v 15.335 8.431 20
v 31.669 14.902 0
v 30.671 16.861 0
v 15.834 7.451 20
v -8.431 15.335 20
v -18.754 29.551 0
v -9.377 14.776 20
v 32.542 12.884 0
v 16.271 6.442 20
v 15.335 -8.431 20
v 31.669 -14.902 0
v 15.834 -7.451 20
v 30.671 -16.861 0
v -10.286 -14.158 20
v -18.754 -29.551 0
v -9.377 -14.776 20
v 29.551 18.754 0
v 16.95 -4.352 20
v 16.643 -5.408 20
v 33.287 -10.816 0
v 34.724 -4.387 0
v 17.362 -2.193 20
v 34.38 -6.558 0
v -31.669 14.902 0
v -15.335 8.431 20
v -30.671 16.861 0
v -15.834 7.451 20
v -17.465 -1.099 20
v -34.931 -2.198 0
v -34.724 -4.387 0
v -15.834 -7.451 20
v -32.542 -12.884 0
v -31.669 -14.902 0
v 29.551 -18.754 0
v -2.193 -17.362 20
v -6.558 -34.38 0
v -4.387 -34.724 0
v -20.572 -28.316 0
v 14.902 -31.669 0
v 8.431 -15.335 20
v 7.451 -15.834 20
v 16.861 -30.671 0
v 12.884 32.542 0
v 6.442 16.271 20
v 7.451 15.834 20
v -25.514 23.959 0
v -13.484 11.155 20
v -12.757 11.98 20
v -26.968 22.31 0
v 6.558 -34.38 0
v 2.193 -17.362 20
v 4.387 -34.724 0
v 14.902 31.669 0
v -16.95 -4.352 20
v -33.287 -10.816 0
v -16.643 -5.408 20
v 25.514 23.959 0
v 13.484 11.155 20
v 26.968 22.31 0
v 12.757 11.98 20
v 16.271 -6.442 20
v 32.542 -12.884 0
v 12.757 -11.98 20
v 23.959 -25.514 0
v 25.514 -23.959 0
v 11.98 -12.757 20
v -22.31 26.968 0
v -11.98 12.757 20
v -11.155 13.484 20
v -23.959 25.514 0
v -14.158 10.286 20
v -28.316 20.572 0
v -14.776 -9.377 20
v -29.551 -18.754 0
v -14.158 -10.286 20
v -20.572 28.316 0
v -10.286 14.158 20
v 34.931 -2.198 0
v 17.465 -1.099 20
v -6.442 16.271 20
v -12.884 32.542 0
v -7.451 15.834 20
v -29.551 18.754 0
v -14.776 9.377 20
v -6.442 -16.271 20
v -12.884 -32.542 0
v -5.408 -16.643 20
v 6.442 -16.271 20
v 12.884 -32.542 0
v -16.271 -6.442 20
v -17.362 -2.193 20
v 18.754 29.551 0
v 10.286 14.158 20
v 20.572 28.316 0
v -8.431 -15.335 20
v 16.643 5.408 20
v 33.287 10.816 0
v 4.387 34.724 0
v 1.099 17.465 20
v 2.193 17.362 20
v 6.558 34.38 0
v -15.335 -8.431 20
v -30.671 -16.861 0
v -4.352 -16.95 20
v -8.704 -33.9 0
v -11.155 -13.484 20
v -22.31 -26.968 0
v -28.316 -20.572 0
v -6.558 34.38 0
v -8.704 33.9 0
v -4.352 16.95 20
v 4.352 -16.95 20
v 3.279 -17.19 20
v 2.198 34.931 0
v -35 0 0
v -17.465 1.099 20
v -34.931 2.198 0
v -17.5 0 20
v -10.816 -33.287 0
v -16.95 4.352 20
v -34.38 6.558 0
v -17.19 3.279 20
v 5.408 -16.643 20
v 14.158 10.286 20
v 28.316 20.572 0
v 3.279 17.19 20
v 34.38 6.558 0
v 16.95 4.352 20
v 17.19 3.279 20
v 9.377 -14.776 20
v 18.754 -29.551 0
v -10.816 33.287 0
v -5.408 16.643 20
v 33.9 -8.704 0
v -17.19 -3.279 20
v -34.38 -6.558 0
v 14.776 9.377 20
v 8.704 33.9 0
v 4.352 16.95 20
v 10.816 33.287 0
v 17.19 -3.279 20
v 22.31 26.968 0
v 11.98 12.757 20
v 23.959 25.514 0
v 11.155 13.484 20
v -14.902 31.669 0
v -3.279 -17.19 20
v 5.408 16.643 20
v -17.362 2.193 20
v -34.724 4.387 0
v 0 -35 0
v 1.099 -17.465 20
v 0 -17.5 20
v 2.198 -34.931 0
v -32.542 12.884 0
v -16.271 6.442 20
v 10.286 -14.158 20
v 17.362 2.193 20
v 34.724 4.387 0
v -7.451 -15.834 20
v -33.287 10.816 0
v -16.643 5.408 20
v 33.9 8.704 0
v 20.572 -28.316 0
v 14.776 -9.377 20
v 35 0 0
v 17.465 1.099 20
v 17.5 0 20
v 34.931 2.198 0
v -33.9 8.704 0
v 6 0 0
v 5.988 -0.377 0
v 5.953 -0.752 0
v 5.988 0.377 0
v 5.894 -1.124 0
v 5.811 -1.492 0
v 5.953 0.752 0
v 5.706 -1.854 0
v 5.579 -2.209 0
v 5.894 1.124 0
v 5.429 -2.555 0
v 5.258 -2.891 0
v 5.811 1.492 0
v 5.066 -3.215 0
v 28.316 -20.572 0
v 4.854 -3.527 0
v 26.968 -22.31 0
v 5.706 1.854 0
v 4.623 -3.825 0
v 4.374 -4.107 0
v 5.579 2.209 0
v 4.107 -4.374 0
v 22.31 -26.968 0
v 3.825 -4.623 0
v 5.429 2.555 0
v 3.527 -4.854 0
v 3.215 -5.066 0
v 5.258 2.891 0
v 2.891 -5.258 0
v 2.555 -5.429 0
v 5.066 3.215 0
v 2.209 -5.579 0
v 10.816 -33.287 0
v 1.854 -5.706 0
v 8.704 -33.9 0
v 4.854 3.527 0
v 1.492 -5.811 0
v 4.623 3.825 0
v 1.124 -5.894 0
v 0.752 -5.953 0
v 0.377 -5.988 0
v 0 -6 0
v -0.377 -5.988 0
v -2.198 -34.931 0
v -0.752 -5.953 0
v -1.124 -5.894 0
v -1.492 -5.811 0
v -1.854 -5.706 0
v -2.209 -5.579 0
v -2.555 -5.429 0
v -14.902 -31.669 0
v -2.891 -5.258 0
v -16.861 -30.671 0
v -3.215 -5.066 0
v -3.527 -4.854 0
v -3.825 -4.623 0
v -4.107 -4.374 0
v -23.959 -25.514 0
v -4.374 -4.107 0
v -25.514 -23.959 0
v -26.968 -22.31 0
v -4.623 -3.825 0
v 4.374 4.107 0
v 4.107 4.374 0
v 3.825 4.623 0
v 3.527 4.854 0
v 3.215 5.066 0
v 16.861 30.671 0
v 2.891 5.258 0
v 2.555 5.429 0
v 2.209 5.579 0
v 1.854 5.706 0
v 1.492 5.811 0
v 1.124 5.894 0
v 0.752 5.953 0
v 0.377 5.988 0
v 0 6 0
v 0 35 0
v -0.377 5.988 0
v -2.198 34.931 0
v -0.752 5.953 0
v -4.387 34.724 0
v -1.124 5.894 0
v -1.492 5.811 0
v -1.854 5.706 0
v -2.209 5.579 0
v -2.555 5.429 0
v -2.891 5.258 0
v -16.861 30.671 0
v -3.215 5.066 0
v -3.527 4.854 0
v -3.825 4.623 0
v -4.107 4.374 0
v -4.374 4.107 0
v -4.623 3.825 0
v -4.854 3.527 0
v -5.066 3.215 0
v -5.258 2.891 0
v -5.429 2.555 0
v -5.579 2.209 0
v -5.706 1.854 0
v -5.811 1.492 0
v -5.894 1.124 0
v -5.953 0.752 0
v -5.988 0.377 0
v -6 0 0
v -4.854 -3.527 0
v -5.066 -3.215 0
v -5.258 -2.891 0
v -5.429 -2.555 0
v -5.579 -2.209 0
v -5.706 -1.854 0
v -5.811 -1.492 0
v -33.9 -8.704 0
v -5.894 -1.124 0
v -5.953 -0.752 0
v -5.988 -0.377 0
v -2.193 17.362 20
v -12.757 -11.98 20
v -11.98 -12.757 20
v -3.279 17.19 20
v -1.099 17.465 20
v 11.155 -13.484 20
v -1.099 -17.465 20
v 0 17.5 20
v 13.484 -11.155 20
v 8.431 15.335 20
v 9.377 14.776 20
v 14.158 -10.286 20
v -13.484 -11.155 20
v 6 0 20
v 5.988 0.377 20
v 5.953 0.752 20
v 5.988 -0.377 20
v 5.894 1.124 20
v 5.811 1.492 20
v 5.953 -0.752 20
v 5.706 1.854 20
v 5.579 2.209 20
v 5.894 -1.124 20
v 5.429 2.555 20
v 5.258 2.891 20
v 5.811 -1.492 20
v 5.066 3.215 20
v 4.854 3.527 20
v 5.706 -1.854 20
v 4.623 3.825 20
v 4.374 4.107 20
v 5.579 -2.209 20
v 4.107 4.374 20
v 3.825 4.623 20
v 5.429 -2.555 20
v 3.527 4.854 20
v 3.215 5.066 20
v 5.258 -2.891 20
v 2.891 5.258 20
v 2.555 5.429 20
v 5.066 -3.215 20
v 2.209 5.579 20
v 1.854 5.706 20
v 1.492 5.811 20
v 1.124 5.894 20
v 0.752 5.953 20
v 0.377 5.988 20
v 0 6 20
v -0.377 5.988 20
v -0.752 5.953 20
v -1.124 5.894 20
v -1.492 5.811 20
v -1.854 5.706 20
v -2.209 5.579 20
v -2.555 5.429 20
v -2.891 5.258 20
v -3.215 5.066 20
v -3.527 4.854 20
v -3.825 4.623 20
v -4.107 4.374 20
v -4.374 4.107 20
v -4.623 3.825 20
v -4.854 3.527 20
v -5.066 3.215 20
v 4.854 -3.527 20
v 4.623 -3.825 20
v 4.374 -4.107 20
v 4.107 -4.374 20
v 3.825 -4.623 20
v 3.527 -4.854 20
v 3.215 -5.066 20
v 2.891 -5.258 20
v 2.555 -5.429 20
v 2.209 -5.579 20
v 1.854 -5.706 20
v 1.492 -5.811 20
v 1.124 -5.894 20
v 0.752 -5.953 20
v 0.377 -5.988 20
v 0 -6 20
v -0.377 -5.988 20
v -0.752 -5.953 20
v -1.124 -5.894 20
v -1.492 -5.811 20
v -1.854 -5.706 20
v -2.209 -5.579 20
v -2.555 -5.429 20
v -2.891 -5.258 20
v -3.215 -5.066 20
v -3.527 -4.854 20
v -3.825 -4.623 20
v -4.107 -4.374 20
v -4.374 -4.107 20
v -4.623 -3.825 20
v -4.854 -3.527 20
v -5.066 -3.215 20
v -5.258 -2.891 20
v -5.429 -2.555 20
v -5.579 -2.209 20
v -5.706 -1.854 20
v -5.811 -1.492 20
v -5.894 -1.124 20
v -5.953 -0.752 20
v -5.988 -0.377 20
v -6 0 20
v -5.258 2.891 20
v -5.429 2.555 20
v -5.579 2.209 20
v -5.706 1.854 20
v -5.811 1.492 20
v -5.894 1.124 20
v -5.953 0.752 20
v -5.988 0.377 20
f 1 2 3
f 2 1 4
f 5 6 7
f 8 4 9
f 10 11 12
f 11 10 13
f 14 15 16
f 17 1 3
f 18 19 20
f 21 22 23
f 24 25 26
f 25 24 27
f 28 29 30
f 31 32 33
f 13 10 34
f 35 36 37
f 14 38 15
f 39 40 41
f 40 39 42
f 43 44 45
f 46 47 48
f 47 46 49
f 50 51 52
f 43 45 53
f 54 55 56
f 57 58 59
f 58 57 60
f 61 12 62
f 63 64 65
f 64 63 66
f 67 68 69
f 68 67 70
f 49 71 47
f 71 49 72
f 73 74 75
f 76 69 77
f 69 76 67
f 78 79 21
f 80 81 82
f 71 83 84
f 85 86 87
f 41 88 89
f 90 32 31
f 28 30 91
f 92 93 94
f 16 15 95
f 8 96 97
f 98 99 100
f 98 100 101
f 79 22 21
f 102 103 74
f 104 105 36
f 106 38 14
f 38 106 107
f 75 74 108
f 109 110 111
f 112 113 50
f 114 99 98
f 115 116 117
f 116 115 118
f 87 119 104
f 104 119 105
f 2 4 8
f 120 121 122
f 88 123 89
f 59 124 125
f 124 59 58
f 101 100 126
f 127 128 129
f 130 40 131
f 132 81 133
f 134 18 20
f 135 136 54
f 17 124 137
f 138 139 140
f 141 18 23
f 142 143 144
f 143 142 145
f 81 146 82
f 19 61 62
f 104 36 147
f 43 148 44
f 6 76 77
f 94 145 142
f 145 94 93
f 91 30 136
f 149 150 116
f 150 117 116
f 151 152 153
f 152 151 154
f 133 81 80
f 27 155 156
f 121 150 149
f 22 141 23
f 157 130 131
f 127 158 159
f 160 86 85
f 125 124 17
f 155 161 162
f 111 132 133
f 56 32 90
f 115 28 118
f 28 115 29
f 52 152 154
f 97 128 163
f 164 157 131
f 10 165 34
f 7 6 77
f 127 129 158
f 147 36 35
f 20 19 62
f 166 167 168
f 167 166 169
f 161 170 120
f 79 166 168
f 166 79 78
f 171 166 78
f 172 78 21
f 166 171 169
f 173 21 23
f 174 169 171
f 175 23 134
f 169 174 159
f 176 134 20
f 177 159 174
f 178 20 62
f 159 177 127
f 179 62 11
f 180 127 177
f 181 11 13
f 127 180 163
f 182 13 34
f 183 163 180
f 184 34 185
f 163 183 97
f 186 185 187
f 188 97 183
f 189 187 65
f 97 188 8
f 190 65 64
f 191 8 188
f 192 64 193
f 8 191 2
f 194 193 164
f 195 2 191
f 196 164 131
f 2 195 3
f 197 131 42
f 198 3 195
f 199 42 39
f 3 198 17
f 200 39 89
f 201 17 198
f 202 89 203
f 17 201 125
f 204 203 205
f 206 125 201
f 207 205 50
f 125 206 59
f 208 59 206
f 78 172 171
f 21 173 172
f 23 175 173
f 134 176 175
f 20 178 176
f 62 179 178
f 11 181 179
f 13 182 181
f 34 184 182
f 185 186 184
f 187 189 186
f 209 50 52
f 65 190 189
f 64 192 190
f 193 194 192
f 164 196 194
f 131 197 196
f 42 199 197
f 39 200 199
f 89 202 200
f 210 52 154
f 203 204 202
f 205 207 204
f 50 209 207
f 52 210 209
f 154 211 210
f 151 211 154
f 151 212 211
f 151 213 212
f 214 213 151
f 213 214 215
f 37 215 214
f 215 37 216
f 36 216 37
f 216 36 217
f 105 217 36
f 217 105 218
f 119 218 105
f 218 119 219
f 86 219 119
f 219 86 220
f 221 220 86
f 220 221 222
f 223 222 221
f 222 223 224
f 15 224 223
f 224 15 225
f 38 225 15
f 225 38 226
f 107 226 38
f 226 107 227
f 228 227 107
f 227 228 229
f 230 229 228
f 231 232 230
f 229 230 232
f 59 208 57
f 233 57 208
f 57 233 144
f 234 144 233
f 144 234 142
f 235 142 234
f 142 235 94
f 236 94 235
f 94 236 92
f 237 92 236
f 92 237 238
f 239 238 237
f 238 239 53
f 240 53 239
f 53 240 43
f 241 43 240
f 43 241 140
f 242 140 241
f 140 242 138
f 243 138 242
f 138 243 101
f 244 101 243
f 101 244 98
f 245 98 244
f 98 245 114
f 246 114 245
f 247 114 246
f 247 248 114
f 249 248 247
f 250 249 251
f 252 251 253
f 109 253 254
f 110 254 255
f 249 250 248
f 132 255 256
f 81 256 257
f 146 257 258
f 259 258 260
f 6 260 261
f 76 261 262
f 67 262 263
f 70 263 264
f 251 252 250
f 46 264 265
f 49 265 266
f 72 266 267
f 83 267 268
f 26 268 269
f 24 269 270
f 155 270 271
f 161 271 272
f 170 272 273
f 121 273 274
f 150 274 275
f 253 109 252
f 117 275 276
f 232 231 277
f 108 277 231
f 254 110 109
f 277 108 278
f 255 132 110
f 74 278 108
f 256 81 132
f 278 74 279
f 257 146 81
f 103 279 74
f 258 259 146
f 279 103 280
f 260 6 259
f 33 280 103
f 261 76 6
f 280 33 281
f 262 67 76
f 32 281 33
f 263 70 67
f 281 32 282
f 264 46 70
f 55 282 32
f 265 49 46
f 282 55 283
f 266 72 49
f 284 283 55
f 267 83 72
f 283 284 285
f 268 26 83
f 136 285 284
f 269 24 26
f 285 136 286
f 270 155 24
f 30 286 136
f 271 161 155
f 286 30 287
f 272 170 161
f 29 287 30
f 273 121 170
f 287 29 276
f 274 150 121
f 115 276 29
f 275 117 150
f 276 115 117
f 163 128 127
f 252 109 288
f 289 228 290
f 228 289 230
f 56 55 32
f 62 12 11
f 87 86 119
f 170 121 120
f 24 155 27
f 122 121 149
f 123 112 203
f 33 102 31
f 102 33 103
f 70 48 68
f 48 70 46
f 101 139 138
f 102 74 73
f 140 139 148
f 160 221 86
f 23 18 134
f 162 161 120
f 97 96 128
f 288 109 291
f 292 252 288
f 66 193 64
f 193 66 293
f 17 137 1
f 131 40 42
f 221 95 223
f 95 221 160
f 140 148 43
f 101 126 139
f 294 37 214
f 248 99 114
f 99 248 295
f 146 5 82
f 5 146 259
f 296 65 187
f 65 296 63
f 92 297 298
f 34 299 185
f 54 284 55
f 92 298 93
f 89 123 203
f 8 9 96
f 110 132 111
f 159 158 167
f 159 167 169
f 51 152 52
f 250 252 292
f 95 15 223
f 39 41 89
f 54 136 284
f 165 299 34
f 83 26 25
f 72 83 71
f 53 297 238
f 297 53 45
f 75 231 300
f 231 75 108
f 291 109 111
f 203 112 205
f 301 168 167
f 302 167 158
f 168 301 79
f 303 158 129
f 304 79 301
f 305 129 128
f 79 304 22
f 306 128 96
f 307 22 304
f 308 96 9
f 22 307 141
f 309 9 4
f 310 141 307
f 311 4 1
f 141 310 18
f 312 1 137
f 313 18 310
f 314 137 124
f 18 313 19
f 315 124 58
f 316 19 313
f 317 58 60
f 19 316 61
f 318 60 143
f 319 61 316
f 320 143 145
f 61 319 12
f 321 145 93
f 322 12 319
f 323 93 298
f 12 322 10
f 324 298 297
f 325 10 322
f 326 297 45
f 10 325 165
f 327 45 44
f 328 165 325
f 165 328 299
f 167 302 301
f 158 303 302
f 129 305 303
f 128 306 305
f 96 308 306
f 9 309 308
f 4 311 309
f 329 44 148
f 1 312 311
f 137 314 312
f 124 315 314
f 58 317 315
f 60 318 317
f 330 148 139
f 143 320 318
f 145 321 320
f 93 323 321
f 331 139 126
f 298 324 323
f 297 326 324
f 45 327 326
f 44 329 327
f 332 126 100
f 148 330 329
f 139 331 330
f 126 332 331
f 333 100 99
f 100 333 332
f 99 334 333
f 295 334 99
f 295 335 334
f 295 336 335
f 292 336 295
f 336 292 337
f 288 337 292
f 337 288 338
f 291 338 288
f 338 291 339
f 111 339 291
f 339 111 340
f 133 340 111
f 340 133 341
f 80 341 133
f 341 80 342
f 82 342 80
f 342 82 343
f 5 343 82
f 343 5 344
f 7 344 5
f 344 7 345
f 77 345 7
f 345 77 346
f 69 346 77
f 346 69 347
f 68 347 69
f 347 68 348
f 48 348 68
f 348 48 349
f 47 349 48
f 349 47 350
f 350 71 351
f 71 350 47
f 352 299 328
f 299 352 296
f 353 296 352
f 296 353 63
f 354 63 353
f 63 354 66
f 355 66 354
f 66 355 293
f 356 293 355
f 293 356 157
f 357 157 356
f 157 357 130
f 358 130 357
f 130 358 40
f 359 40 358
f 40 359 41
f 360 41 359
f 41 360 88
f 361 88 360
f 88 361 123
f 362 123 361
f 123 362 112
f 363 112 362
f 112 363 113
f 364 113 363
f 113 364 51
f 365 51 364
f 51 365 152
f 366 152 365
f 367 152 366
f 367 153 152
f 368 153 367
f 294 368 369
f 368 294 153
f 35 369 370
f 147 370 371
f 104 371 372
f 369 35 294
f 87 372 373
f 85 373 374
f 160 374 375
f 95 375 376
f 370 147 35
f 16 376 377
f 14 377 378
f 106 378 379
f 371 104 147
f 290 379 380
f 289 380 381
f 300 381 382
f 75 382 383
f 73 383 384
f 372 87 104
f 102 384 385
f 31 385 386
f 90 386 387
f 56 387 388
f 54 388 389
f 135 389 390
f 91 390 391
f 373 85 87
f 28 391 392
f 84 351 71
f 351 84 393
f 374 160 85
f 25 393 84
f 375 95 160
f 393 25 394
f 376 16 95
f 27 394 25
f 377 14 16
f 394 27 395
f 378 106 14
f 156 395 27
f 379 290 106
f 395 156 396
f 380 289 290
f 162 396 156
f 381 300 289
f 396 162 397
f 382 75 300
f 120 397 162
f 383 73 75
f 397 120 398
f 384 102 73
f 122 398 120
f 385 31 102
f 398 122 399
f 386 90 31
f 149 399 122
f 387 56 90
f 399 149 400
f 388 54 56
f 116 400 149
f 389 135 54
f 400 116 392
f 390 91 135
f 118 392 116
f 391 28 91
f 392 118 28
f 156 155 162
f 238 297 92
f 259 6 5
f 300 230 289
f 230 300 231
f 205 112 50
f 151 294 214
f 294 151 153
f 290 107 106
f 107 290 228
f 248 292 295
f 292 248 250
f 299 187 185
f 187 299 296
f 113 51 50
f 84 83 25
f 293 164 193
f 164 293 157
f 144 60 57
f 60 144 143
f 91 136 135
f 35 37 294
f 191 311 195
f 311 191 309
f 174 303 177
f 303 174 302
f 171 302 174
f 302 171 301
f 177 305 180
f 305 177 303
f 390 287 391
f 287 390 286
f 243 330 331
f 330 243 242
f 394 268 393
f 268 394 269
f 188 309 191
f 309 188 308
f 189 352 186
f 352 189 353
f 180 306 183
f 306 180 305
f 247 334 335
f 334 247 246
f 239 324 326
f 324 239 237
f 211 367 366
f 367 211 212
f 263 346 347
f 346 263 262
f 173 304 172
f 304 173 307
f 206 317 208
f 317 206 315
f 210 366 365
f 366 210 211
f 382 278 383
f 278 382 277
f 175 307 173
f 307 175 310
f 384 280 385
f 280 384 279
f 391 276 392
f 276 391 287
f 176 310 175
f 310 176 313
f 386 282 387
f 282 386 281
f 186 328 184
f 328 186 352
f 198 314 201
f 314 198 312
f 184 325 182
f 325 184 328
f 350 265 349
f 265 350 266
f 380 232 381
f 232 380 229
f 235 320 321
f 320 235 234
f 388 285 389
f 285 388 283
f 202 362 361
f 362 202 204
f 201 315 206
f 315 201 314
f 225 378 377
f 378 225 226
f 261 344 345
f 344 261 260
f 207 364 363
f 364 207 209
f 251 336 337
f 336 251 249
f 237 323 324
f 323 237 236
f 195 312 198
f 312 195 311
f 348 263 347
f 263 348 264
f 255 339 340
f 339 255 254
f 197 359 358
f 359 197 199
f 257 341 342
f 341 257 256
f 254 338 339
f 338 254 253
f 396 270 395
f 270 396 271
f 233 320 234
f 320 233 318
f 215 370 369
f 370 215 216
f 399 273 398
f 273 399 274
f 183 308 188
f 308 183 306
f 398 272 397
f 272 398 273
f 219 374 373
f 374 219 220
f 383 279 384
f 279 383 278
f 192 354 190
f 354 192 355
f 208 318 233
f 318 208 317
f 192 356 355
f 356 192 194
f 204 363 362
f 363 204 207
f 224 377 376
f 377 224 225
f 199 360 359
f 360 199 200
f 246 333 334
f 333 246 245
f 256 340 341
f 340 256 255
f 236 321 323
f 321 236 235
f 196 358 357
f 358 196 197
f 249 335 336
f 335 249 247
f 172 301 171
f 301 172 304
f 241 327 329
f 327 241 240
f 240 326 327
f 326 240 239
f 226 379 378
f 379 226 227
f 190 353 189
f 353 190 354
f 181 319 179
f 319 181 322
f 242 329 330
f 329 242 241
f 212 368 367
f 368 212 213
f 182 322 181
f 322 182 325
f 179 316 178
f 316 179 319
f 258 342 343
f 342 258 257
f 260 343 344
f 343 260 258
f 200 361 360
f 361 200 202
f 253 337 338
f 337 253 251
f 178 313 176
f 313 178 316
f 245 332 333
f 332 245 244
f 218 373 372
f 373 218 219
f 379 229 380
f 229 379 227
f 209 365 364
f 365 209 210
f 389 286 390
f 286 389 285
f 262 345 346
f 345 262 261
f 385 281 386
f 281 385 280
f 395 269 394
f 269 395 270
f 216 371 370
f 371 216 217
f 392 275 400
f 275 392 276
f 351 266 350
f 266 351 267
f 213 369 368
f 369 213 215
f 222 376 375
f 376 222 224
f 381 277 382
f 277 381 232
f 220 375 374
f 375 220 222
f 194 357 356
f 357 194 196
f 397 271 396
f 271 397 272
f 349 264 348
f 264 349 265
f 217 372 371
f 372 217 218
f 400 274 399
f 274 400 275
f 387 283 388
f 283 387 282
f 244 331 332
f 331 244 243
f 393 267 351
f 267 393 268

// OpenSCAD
difference(){
    cylinder( r2 = 17.5, r1 = 35, h = 20, $fn = 100 );
    translate( [ 0, 0, -1 ] )
        cylinder( r = 6, h = 22, $fn = 100 );
}
